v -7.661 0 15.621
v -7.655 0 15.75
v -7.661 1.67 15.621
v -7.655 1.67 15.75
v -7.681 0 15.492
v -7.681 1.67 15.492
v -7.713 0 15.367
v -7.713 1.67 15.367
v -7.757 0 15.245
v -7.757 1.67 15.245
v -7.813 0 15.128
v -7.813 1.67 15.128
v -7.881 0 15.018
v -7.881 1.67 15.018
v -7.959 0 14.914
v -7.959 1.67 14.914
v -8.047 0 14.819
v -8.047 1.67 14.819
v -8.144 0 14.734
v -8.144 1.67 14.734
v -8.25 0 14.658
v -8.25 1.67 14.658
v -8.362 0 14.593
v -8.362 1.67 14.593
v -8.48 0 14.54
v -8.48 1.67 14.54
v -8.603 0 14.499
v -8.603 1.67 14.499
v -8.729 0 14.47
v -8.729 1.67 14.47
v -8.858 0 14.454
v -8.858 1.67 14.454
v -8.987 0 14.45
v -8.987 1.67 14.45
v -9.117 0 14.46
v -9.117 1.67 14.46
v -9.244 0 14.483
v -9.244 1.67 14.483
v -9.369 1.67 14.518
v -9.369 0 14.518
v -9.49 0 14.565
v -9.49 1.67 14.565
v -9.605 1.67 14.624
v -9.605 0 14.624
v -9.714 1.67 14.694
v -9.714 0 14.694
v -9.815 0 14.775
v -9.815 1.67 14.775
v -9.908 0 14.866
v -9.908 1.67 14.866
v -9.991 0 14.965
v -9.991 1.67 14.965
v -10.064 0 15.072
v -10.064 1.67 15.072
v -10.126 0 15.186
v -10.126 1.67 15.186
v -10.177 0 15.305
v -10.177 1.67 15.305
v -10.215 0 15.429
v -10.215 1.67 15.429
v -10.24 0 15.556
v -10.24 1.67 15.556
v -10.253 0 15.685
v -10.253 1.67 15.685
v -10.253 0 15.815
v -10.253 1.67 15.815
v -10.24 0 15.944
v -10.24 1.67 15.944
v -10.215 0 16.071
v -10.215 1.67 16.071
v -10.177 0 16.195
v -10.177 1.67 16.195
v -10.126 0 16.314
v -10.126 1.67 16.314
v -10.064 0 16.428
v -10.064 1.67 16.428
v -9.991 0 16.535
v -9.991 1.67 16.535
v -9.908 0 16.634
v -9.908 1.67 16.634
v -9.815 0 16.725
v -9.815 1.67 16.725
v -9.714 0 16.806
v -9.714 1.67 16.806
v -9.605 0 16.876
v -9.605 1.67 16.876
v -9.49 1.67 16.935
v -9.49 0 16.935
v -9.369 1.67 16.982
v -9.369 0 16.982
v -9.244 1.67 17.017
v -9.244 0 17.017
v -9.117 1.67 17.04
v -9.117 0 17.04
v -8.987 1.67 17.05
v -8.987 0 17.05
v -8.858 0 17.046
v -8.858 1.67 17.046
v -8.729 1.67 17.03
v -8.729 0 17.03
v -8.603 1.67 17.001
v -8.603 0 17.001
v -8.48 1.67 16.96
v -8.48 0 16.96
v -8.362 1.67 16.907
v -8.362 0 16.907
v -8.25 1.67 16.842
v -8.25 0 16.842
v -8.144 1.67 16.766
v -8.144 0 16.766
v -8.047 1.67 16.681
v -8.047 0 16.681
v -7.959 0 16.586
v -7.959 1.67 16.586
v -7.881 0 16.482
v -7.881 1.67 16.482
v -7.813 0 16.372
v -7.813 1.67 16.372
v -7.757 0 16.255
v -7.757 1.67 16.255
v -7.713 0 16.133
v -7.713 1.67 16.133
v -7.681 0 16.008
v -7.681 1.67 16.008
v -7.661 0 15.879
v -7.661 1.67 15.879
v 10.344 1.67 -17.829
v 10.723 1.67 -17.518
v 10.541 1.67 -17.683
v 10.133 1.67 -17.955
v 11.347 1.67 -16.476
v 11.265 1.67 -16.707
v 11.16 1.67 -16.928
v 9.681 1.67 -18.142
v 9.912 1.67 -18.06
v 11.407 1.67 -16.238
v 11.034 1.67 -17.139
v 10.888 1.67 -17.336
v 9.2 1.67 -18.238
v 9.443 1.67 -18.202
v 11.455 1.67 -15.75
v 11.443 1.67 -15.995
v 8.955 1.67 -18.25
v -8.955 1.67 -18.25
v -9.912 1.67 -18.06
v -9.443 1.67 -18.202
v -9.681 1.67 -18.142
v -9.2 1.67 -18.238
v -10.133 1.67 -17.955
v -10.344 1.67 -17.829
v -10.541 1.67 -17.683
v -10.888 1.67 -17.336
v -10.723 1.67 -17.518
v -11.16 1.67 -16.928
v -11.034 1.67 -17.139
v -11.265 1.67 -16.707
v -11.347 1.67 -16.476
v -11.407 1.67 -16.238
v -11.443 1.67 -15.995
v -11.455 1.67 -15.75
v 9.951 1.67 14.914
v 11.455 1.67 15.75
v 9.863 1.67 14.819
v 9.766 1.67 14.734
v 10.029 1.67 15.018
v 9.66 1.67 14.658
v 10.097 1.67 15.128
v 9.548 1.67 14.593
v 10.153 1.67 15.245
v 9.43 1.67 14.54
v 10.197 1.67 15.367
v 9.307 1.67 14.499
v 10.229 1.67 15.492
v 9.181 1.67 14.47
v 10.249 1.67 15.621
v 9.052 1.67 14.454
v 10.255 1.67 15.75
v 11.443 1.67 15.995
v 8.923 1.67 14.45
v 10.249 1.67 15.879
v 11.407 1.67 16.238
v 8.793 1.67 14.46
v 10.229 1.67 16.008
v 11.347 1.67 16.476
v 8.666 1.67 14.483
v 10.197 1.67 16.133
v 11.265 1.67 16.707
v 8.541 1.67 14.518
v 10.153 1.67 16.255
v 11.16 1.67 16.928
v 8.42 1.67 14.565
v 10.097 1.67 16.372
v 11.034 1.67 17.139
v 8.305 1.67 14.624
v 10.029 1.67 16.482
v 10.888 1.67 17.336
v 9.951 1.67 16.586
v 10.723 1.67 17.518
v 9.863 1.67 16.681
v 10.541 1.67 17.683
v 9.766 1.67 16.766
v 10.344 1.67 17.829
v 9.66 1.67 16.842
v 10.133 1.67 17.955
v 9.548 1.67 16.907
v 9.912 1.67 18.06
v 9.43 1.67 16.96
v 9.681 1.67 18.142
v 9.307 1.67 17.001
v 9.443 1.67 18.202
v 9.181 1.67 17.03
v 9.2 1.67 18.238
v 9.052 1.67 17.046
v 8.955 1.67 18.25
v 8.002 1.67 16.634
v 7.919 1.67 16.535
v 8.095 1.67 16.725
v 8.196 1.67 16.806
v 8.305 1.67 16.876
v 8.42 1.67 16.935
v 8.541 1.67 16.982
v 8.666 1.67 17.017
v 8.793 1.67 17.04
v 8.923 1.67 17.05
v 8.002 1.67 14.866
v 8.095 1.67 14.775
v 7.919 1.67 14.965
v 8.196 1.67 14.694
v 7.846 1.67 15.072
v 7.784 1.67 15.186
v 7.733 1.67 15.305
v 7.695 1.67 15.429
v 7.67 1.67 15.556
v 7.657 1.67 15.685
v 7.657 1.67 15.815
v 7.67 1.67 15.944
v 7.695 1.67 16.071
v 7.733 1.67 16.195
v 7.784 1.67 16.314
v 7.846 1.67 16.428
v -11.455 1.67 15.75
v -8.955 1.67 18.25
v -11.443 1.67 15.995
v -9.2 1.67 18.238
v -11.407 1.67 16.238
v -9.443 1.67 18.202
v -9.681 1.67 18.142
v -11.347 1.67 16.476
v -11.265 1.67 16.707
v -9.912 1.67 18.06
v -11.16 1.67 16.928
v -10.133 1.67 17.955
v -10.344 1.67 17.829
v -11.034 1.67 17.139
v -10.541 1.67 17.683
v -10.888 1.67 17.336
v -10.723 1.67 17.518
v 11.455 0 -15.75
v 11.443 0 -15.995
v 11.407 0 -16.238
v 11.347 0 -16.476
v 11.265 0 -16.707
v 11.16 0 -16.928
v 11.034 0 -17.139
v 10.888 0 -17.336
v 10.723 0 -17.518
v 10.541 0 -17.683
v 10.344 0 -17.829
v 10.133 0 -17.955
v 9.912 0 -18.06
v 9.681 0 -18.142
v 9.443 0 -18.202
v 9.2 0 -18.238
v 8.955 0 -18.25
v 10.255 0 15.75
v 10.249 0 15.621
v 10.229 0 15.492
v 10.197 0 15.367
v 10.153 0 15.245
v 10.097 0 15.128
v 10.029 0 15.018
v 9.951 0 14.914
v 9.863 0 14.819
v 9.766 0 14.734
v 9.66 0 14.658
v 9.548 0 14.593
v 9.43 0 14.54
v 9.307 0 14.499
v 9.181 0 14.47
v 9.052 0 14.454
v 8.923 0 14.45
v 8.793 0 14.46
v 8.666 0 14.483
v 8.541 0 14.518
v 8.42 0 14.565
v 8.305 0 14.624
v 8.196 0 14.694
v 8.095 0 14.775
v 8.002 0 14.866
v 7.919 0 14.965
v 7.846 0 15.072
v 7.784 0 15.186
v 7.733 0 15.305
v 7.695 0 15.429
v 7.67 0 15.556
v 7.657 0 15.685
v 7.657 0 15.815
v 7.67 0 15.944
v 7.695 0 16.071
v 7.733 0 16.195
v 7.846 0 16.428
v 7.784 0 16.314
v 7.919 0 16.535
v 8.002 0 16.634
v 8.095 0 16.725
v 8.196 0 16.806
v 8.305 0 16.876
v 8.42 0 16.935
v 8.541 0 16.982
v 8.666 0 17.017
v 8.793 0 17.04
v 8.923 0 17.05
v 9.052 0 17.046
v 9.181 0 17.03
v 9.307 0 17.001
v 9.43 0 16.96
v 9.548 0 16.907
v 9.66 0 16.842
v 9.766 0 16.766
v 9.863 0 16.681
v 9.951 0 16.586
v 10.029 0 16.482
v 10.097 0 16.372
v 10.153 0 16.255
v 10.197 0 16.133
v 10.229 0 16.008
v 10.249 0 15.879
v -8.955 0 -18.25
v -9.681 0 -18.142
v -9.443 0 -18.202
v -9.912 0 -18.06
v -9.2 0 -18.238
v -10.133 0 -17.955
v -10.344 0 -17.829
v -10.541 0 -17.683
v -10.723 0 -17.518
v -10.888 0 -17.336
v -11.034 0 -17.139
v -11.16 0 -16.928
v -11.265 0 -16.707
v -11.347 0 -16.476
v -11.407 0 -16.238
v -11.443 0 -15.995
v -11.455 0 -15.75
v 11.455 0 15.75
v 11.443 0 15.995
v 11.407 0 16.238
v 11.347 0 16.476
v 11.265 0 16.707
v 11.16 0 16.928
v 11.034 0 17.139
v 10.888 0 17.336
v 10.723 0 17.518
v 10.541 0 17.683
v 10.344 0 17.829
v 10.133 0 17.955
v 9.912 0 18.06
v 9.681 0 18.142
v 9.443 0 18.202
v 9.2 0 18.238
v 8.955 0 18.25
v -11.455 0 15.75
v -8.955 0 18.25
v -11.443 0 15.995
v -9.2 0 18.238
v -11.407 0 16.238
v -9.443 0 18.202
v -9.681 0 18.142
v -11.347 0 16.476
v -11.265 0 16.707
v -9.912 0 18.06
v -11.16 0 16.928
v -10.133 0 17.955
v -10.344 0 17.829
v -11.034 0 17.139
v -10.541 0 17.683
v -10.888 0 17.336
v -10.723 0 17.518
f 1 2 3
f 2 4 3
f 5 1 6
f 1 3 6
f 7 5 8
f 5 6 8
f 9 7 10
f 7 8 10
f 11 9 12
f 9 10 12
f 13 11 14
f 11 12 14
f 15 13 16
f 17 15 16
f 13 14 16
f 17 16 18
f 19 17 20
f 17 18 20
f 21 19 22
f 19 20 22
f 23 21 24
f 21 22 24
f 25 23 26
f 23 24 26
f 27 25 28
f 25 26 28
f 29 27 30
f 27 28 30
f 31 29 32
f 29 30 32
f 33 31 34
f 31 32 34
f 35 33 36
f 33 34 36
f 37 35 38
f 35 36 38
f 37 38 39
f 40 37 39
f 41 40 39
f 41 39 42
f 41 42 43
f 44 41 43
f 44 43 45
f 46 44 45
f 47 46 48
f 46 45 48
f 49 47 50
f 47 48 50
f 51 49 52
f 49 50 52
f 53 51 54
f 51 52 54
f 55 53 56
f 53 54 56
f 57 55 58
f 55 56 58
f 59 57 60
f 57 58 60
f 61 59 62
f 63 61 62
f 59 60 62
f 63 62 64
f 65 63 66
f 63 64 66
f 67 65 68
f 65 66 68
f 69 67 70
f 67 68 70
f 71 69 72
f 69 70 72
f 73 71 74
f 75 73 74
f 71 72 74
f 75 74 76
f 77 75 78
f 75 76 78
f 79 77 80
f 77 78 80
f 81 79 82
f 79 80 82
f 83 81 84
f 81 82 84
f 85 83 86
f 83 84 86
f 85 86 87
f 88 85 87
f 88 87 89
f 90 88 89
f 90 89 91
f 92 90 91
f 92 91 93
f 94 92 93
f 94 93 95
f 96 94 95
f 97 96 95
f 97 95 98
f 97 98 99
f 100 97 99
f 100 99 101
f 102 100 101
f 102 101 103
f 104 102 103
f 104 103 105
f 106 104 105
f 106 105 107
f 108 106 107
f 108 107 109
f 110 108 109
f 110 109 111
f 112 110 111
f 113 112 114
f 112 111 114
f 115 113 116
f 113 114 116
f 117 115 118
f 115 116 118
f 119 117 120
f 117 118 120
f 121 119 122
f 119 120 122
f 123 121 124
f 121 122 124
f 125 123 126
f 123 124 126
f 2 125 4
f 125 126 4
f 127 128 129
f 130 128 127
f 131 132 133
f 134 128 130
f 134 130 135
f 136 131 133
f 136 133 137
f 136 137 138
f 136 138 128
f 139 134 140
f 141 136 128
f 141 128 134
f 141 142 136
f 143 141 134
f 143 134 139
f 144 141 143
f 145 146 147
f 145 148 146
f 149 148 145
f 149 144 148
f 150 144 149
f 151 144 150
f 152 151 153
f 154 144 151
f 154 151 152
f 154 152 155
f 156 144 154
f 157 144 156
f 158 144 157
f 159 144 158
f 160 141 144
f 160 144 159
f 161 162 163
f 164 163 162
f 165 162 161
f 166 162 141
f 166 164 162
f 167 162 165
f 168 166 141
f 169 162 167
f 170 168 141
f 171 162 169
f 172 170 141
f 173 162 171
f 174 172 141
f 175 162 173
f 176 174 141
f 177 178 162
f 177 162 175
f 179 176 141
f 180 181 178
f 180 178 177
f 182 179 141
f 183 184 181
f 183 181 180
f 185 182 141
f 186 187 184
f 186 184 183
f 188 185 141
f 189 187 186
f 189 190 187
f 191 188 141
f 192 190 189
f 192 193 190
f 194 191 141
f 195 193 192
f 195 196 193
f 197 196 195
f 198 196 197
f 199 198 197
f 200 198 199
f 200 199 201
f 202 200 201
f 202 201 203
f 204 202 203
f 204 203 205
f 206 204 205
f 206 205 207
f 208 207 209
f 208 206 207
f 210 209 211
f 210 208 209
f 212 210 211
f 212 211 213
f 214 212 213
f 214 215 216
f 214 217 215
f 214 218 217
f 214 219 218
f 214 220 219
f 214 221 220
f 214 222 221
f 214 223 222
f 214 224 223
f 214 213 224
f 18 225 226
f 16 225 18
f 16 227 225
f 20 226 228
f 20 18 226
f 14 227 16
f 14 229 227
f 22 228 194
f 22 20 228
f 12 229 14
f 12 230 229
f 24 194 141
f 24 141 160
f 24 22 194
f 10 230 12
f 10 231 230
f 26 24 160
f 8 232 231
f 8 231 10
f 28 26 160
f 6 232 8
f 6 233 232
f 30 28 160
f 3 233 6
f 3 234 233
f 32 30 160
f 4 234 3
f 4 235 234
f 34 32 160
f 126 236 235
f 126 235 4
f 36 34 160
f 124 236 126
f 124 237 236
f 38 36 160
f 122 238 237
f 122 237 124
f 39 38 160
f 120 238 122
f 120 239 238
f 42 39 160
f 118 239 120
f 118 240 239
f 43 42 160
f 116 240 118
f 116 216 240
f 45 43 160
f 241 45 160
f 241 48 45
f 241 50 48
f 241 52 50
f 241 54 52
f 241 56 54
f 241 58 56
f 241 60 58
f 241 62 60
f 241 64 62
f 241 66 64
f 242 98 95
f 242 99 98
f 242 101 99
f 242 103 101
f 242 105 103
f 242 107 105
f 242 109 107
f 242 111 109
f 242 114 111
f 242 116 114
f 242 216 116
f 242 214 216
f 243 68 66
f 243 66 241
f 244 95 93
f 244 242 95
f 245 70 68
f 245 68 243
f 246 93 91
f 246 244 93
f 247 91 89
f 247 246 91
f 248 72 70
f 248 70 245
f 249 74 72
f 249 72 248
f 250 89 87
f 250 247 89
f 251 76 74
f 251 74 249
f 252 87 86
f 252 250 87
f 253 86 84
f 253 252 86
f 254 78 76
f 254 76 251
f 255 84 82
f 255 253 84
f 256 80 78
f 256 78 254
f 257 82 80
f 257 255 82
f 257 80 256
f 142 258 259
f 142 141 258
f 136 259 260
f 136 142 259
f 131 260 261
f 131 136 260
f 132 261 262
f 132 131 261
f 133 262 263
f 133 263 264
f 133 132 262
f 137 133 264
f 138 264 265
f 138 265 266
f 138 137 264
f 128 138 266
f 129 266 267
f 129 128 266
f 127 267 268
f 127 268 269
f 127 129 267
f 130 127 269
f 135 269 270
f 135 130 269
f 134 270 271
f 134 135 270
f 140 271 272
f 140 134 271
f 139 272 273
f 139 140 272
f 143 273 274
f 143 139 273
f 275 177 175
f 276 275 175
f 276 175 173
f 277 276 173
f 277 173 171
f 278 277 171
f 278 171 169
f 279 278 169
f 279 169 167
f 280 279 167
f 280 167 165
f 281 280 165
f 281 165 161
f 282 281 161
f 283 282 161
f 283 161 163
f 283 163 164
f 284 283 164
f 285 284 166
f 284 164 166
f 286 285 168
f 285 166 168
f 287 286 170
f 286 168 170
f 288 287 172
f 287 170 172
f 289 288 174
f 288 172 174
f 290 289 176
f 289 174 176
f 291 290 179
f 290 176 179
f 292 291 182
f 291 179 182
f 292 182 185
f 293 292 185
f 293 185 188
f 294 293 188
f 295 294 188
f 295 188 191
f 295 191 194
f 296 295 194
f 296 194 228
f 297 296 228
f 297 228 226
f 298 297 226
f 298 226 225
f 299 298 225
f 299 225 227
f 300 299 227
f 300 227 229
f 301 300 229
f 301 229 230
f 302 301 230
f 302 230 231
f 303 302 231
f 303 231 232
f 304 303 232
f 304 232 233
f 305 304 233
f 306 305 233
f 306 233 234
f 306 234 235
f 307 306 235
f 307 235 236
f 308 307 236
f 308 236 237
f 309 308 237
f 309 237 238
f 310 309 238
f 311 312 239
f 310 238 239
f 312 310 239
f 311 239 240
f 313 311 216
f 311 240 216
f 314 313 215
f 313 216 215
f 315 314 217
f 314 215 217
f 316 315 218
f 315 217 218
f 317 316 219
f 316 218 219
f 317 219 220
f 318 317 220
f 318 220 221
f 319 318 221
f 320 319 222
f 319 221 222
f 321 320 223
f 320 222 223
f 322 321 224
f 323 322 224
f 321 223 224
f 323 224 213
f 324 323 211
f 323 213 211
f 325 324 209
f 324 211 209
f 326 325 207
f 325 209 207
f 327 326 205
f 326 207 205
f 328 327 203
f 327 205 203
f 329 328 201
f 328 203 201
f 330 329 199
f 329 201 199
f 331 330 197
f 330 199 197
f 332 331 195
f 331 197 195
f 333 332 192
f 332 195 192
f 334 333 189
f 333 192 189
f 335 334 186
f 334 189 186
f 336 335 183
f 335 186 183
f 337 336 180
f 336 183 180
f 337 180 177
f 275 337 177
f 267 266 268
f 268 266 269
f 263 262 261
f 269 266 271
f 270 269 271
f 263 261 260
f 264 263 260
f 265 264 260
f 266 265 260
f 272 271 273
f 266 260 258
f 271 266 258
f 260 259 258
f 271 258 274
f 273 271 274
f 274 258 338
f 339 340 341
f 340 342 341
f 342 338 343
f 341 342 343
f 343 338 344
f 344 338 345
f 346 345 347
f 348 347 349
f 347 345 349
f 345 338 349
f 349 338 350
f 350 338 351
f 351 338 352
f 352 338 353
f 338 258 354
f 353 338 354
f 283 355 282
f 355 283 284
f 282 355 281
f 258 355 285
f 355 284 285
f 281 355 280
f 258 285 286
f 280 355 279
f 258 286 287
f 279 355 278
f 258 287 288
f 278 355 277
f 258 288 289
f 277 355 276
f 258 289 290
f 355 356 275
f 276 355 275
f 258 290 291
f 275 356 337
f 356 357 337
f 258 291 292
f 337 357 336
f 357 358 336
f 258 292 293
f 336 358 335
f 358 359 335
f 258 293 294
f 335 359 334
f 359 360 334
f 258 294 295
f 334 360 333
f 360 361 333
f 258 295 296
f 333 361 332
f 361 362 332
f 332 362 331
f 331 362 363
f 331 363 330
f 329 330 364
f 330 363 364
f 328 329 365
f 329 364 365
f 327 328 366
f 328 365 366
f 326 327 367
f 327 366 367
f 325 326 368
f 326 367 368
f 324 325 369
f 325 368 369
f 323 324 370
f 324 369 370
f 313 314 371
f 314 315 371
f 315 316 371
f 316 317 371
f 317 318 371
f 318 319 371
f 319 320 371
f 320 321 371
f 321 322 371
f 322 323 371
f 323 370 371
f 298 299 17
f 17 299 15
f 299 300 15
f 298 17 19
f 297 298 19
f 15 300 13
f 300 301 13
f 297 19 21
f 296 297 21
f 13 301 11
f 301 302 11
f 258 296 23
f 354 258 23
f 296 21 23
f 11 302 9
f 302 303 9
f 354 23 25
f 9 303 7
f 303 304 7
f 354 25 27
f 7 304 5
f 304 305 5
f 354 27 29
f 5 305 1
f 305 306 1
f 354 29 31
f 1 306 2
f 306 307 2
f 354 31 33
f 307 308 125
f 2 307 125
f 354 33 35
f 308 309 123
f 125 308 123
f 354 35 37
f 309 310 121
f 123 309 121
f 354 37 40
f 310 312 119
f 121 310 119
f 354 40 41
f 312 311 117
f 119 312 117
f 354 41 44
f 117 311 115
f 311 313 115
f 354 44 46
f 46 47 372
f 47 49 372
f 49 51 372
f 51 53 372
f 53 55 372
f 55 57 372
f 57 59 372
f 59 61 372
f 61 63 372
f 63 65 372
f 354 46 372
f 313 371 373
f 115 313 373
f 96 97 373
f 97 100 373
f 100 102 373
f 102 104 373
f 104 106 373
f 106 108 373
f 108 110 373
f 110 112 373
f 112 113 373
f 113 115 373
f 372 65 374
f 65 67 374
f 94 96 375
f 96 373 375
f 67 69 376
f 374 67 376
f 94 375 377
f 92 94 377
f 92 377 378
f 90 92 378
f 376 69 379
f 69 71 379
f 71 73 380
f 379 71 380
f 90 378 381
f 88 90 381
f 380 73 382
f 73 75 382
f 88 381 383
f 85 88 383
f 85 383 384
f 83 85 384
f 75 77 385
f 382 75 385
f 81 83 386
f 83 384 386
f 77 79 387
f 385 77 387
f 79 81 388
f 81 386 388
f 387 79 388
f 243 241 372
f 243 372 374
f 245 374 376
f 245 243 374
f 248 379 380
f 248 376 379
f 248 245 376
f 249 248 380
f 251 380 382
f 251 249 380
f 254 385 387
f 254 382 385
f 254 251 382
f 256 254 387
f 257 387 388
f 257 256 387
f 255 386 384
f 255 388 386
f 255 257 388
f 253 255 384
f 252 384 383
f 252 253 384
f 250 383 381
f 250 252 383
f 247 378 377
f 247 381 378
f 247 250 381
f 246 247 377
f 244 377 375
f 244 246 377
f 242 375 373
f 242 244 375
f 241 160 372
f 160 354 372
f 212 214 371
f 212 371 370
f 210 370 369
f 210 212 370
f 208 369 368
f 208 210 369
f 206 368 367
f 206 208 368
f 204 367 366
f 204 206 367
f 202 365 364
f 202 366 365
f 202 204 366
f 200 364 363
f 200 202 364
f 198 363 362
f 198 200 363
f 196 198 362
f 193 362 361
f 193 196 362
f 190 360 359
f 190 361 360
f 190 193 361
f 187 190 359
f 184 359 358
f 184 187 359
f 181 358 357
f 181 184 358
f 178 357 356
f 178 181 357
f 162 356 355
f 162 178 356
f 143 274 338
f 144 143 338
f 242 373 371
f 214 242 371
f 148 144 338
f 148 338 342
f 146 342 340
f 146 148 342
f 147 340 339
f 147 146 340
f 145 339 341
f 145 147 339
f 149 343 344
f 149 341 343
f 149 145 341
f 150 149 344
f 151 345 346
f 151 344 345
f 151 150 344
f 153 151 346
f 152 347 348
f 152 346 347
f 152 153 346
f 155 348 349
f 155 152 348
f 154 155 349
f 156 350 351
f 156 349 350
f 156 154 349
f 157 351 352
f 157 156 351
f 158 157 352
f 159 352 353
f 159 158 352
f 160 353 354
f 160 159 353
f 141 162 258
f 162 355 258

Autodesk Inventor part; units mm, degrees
ref_plane "YZ Plane" through (0, 0, 0) normal (1, 0, 0) x (0, 1, 0)
ref_plane "XZ Plane" through (0, 0, 0) normal (0, 1, 0) x (-1, 0, 0)
ref_plane "XY Plane" through (0, 0, 0) normal (0, 0, 1) x (1, 0, 0)
sketch "Skizze1" plane through (0, 0, 0) normal (0, 1, 0) x (-1, 0, 0)
  line L0 (-11.455, -18.25) -> (11.455, -18.25)
  line L1 (11.455, -18.25) -> (11.455, 18.25)
  line L2 (11.455, 18.25) -> (-11.455, 18.25)
  line L3 (-11.455, 18.25) -> (-11.455, -18.25)
  line L4 (-11.455, -18.25) -> (11.455, 18.25) construction
  line L5 (11.455, -18.25) -> (-11.455, 18.25) construction
  point P0 (0, 0)
  dimension "d0" = 22.91
  dimension "d1" = 36.5
extrude "Extrusion1" add sketch "Skizze1" along normal blind 1.67
fillet "Rundung1" radius 2.5 4 edges at (-11.455, 0.835, 18.25) (11.455, 0.835, -18.25) (11.455, 0.835, 18.25) (-11.455, 0.835, -18.25)
sketch "Skizze2" plane through (0, 1.67, 0) normal (0, 1, 0) x (1, 0, 0)
  circle A0 centre (-8.955, -15.75) radius 1.3
  line L0 (-8.955, -18.25) -> (8.955, -18.25) projected
  line L1 (-11.455, 15.75) -> (-11.455, -15.75) projected
  line L2 (0, 0) -> (0, -21.9467) construction
  circle A1 centre (8.955, -15.75) radius 1.3
  dimension "d5" = 2.6
  dimension "d6" = 2.5
  dimension "d7" = 2.5
  dimension "d8" = 17.91
extrude "Extrusion2" cut sketch "Skizze2" against normal up to next
properties part number "PowerBoost500"
